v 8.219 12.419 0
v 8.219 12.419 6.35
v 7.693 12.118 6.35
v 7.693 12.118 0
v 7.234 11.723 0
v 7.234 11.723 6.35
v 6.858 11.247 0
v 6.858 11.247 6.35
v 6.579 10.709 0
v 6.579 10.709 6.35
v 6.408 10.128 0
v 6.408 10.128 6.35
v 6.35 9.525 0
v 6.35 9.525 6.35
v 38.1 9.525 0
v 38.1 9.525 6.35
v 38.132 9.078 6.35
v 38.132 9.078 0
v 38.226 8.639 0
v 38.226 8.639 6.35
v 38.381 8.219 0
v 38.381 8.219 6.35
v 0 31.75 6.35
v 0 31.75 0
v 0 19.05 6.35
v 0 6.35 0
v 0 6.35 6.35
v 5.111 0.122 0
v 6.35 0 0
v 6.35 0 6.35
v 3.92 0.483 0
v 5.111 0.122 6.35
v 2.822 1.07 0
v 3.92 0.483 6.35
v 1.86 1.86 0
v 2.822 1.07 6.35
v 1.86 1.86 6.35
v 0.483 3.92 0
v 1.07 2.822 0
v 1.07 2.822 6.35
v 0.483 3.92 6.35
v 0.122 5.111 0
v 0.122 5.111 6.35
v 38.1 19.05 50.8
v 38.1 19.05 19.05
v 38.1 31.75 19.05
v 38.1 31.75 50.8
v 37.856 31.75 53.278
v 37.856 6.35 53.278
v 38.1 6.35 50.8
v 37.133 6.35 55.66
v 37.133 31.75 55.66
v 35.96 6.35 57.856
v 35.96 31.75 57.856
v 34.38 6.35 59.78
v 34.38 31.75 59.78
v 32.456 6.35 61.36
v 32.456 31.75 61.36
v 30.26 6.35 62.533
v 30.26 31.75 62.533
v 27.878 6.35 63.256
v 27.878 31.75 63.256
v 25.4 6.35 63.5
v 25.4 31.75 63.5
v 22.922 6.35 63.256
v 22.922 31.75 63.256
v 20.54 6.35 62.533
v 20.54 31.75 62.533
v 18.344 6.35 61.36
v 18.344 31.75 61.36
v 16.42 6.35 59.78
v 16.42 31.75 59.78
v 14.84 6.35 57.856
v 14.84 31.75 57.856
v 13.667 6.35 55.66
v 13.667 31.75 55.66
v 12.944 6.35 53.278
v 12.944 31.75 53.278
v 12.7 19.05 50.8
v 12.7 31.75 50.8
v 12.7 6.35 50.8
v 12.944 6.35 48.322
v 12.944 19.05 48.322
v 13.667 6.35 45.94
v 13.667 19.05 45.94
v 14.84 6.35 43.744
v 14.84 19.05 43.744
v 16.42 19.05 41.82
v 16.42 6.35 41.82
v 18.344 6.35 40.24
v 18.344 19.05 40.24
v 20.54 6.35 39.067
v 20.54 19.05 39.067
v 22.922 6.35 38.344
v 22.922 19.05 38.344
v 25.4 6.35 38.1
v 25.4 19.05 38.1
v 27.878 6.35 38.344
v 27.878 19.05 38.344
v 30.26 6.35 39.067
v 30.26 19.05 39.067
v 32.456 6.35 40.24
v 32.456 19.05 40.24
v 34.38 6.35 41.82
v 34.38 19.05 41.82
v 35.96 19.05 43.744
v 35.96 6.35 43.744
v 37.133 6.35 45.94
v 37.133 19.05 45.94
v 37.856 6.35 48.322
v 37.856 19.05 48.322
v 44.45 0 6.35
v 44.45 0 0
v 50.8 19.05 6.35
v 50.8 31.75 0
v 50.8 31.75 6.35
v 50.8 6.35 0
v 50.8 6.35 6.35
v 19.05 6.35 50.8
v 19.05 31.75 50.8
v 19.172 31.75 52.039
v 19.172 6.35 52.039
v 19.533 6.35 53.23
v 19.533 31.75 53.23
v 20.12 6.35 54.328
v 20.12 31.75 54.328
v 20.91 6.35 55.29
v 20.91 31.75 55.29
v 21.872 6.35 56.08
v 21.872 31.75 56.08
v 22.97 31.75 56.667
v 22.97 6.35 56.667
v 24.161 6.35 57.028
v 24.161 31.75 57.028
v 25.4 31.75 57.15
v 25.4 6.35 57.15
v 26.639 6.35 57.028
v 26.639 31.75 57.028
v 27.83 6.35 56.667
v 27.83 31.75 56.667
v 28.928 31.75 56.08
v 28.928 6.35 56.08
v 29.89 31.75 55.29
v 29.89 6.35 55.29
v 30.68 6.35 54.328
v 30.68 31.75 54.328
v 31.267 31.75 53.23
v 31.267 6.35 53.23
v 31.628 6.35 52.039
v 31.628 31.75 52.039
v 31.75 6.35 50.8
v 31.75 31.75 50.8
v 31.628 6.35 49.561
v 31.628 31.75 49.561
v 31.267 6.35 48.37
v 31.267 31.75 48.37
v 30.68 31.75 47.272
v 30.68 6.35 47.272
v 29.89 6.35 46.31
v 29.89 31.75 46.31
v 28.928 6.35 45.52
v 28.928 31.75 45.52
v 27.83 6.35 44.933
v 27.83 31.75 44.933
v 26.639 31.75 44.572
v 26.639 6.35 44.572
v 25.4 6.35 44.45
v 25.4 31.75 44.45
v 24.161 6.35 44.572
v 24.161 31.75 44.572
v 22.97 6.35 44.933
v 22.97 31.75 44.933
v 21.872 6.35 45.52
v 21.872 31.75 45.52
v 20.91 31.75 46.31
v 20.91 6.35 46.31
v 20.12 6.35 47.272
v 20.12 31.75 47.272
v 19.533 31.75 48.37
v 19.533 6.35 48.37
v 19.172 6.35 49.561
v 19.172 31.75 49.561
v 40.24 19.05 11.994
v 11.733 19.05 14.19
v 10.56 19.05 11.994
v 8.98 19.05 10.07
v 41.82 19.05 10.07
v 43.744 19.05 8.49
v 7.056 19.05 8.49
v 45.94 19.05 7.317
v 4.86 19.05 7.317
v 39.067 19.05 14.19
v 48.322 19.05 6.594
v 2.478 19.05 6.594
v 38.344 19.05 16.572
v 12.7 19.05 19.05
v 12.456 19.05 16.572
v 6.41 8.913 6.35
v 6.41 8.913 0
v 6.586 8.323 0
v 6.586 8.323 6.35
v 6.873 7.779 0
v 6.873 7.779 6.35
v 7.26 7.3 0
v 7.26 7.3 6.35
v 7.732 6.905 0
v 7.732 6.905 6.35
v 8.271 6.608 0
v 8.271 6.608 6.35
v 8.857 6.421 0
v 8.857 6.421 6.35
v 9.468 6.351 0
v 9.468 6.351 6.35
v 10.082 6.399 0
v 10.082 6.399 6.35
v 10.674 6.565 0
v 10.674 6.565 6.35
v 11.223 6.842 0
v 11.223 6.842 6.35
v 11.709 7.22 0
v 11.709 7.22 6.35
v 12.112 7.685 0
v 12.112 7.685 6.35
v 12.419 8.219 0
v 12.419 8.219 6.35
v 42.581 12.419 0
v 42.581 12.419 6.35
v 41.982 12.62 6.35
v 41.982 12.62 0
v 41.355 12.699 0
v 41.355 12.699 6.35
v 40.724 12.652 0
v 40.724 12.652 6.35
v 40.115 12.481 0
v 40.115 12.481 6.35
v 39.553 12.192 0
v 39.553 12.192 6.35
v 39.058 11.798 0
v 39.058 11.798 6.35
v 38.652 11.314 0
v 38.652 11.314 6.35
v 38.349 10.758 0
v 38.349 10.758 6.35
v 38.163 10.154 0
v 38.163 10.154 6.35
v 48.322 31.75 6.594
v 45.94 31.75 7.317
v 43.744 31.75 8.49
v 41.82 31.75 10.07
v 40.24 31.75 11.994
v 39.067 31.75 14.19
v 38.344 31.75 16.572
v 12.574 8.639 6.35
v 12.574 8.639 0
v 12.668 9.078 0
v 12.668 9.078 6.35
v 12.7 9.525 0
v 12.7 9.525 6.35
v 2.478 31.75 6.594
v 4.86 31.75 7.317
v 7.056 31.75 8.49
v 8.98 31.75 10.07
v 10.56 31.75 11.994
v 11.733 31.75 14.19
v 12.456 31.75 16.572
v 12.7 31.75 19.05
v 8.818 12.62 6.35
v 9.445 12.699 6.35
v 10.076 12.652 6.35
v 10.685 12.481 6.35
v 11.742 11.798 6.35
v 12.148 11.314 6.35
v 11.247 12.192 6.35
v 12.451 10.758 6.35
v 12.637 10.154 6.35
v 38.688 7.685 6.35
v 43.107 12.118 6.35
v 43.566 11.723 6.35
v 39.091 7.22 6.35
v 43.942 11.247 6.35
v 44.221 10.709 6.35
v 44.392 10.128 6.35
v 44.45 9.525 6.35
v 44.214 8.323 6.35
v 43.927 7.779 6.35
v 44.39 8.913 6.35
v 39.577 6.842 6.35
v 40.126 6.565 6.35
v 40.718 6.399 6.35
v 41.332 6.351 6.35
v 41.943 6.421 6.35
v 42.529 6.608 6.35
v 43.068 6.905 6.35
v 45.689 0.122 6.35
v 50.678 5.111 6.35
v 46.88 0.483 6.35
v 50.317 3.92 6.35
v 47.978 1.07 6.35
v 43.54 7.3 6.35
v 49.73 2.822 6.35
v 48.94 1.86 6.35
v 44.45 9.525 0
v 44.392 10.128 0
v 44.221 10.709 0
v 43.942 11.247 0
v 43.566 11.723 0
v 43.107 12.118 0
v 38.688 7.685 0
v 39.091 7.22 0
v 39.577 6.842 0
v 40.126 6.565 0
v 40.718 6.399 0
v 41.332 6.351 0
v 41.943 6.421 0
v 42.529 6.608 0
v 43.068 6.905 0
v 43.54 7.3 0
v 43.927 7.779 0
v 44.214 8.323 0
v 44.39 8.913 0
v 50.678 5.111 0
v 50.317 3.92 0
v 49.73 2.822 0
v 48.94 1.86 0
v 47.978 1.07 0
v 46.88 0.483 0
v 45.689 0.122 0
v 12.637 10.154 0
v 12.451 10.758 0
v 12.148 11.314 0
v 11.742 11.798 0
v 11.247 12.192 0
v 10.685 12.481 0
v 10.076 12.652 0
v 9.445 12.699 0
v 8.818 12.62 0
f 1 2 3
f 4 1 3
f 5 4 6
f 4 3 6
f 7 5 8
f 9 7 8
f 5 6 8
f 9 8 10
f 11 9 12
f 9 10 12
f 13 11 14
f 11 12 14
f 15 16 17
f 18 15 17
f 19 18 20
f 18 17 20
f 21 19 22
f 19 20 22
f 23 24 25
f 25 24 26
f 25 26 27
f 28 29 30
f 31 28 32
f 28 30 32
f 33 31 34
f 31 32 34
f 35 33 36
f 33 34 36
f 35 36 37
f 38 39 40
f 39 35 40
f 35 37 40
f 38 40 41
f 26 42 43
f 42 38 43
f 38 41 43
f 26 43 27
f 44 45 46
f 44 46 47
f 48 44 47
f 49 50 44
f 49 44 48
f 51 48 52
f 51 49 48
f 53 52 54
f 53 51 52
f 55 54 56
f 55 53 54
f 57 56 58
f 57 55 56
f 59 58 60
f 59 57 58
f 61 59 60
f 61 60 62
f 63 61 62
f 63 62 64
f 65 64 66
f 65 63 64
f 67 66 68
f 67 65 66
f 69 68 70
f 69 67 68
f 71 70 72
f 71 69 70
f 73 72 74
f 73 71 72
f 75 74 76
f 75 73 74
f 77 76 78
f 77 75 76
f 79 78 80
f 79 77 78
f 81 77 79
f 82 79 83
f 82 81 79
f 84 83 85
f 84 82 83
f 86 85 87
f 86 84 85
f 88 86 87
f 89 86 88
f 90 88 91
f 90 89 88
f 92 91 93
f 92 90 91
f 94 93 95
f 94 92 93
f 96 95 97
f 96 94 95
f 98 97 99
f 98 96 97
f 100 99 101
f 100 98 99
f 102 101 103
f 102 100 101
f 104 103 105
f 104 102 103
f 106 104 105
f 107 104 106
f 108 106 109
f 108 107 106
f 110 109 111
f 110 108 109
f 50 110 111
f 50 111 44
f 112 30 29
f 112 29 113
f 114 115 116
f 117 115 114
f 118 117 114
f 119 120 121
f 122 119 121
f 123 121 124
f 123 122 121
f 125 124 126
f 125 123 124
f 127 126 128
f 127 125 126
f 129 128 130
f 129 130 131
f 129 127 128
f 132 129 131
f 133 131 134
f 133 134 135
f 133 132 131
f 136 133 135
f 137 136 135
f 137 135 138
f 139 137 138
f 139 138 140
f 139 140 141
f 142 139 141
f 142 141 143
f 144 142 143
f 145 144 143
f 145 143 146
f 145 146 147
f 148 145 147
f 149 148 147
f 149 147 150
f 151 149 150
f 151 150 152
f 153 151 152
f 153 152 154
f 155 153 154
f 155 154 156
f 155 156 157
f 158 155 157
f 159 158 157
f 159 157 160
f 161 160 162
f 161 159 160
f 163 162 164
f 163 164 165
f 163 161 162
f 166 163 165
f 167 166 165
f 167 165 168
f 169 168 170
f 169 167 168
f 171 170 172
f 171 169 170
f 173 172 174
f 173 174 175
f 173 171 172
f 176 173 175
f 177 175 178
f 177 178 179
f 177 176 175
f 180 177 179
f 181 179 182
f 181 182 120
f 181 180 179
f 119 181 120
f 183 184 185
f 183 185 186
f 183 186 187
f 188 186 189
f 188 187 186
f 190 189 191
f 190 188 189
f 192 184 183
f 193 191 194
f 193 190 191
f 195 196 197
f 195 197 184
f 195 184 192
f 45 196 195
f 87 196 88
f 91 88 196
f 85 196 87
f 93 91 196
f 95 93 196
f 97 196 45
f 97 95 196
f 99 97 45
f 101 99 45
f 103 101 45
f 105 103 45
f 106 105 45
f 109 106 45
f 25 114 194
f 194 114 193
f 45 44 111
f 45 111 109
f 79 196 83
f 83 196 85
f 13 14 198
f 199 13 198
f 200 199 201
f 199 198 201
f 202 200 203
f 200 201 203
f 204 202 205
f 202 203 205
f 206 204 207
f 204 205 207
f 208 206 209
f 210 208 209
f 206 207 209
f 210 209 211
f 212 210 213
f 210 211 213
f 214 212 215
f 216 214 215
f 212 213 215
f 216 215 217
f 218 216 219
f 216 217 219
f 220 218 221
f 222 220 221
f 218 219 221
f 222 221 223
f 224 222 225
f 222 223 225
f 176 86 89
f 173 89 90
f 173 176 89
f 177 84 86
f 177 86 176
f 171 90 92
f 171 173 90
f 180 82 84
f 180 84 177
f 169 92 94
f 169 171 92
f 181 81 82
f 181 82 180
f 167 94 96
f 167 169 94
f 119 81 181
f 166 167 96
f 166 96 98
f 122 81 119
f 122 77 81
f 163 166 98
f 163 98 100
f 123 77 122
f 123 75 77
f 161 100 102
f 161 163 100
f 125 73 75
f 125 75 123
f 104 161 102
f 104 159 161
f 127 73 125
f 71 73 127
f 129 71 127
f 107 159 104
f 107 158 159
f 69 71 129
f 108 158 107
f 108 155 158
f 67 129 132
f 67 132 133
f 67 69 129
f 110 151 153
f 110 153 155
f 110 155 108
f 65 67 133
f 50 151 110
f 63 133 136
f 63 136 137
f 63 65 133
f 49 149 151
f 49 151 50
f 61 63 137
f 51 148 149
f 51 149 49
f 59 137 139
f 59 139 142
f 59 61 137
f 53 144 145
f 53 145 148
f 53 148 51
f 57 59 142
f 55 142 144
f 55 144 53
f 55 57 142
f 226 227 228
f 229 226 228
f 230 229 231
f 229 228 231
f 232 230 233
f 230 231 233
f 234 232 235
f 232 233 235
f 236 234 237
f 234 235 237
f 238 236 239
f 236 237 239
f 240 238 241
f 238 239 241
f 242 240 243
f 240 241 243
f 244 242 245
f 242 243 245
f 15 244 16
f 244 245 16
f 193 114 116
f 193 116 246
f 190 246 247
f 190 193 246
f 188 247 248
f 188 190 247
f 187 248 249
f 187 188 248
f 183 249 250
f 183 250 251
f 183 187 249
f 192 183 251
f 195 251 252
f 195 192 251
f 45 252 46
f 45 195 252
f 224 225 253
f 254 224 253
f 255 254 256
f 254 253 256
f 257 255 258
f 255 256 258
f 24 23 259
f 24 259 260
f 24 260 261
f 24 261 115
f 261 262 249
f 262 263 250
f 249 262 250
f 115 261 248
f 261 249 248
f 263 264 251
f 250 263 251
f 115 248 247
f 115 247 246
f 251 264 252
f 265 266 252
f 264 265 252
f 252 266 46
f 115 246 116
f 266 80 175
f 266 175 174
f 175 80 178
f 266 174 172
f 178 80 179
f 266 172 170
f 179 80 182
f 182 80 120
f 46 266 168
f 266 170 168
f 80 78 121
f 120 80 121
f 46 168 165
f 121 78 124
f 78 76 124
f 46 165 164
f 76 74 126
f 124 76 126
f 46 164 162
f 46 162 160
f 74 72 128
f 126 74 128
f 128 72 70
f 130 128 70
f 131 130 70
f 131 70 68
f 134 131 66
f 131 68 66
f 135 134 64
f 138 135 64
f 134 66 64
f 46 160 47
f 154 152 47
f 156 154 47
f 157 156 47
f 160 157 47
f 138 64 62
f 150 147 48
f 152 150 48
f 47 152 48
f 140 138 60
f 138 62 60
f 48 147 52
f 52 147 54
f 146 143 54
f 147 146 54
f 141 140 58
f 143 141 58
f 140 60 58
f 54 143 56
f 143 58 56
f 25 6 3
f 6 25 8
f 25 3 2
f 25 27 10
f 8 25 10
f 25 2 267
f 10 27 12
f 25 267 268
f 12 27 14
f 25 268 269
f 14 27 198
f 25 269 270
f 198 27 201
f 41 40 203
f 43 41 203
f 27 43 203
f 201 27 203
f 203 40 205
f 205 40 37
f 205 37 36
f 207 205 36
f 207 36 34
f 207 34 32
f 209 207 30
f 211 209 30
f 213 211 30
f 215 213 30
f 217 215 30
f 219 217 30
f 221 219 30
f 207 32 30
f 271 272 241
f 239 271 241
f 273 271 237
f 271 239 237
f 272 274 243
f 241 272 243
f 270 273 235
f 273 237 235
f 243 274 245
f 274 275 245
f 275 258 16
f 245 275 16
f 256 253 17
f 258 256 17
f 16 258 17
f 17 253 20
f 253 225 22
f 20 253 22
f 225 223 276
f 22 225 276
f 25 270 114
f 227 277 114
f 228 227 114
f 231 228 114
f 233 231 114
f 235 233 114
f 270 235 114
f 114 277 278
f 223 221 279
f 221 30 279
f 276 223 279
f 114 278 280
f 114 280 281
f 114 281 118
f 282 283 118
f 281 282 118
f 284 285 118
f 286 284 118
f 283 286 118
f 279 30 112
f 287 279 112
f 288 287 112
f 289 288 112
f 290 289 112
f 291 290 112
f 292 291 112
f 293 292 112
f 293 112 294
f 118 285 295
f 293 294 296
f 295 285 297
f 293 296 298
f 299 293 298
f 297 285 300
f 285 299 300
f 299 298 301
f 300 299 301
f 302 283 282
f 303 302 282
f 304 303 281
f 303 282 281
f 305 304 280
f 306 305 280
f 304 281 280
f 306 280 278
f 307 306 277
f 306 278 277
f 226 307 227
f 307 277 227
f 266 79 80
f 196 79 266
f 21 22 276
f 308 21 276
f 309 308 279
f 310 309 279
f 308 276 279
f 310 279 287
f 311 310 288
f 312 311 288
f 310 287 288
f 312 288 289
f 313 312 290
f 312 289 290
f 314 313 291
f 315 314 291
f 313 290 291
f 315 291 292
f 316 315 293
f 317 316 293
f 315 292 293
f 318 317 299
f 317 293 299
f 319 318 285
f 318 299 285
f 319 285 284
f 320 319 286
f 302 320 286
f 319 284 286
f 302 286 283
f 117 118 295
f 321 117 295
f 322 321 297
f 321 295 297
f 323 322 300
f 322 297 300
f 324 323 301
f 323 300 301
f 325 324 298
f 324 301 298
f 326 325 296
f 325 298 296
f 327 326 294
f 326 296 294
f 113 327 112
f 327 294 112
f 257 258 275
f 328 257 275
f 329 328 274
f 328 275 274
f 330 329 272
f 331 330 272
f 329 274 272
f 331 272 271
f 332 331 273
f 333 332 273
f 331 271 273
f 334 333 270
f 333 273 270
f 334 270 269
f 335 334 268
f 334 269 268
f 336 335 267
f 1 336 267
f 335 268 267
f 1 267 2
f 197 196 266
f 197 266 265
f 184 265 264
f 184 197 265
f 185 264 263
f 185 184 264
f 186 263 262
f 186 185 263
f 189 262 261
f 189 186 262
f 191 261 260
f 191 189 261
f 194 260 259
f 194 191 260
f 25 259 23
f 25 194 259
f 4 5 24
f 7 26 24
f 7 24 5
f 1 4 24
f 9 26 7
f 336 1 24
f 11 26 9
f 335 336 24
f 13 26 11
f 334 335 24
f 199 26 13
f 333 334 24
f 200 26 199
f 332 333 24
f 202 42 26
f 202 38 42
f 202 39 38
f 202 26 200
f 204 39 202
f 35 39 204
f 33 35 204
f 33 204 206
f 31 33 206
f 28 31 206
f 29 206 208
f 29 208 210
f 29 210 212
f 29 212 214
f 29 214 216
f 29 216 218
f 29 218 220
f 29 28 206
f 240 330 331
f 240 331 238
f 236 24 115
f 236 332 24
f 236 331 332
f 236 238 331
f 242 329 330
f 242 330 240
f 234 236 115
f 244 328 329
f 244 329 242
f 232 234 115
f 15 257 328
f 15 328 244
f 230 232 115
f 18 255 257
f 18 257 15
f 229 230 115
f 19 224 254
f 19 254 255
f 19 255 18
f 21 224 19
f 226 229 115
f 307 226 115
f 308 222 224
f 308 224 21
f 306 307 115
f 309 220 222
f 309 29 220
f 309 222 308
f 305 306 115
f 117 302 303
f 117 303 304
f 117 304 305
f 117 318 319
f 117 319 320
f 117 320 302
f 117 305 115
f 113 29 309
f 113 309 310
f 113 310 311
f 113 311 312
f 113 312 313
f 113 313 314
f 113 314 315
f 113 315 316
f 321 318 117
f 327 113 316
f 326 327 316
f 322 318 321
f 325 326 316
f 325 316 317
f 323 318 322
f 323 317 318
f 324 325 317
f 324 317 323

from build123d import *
from build123d import SkipClean  # not in build123d's __all__

# Parameters (mm, degrees)
F0_W     = 50.8
F0_H     = 6.35
F1_DEPTH = 31.75
F3_DEPTH = 19.05
F4_DEPTH = 6.35
F6_DEPTH = 6.351


with BuildPart() as f1:
    # F0 (on Front) → F1 (new body)
    with BuildSketch(Plane.XZ):
        with Locations((25.4, 3.175)):
            Rectangle(F0_W, F0_H)
        with BuildLine():
            ThreePointArc((12.7, 19.05), (8.9802561211, 10.0697438789), (0, 6.35))
            Line((0, 6.35), (50.8, 6.35))
            ThreePointArc((50.8, 6.35), (41.8197438789, 10.0697438789), (38.1, 19.05))
            Line((38.1, 19.05), (38.1, 50.8))
            ThreePointArc((38.1, 50.8), (25.4, 38.1), (12.7, 50.8))
            Line((12.7, 50.8), (12.7, 19.05))
        make_face()
        with BuildLine():
            Line((19.05, 50.8), (12.7, 50.8))
            ThreePointArc((12.7, 50.8), (25.4, 38.1), (38.1, 50.8))
            Line((38.1, 50.8), (31.75, 50.8))
            ThreePointArc((31.75, 50.8), (25.4, 44.45), (19.05, 50.8))
        make_face()
        with BuildLine():
            ThreePointArc((38.1, 50.8), (25.4, 63.5), (12.7, 50.8))
            Line((12.7, 50.8), (19.05, 50.8))
            ThreePointArc((19.05, 50.8), (25.4, 57.15), (31.75, 50.8))
            Line((31.75, 50.8), (38.1, 50.8))
        make_face()
    extrude(amount=-F1_DEPTH)

    # F2 (on face) → F3 (cut)
    with BuildSketch(Plane.XZ):
        with BuildLine():
            ThreePointArc((12.7, 19.05), (8.9802561211, 10.0697438789), (0, 6.35))
            Line((0, 6.35), (50.8, 6.35))
            ThreePointArc((50.8, 6.35), (41.8197438789, 10.0697438789), (38.1, 19.05))
            Line((38.1, 19.05), (38.1, 50.8))
            ThreePointArc((38.1, 50.8), (25.4, 38.1), (12.7, 50.8))
            Line((12.7, 50.8), (12.7, 19.05))
        make_face()
    with SkipClean():  # cleaning this boolean's faces spoils the solid; the shape is the same uncleaned
        extrude(amount=-F3_DEPTH, mode=Mode.SUBTRACT)

    # F4 (cut): a face of the model
    f4_faces = [f1.faces().sort_by_distance(p)[0] for p in [
        (25.4, 0, 63.1407897552),
    ]]
    extrude(f4_faces, amount=-F4_DEPTH, mode=Mode.SUBTRACT)

    # F5 (on face) → F6 (cut, through all)
    with BuildSketch(Plane.XY.offset(6.35)):
        with BuildLine():
            ThreePointArc((12.7, 9.525), (11.2473638622, 12.1922247236), (8.2186848968, 12.4188151032))
            ThreePointArc((8.2186848968, 12.4188151032), (10.3079286634, 11.3156118148), (11.849261314, 9.525))
            Line((11.849261314, 9.525), (12.7, 9.525))
        make_face()
        with BuildLine():
            ThreePointArc((11.849261314, 9.525), (10.3079286634, 11.3156118148), (8.2186848968, 12.4188151032))
            ThreePointArc((8.2186848968, 12.4188151032), (6.8577752764, 11.2473638622), (6.35, 9.525))
            Line((6.35, 9.525), (11.849261314, 9.525))
        make_face()
        with BuildLine():
            ThreePointArc((6.35, 9.525), (8.8568824776, 6.4210921444), (12.4188151032, 8.2186848968))
            ThreePointArc((12.4188151032, 8.2186848968), (12.1708000125, 8.8878706063), (11.849261314, 9.525))
            Line((11.849261314, 9.525), (6.35, 9.525))
        make_face()
        with BuildLine():
            ThreePointArc((11.849261314, 9.525), (12.1708000125, 8.8878706063), (12.4188151032, 8.2186848968))
            ThreePointArc((12.4188151032, 8.2186848968), (12.6289078556, 8.8568824776), (12.7, 9.525))
            Line((12.7, 9.525), (11.849261314, 9.525))
        make_face()
        with BuildLine():
            ThreePointArc((38.950738686, 9.525), (40.4920713366, 11.3156118148), (42.5813151032, 12.4188151032))
            ThreePointArc((42.5813151032, 12.4188151032), (39.5526361378, 12.1922247236), (38.1, 9.525))
            Line((38.1, 9.525), (38.950738686, 9.525))
        make_face()
        with BuildLine():
            ThreePointArc((44.45, 9.525), (43.9422247236, 11.2473638622), (42.5813151032, 12.4188151032))
            ThreePointArc((42.5813151032, 12.4188151032), (40.4920713366, 11.3156118148), (38.950738686, 9.525))
            Line((38.950738686, 9.525), (44.45, 9.525))
        make_face()
        with BuildLine():
            ThreePointArc((38.950738686, 9.525), (38.6291999875, 8.8878706063), (38.3811848968, 8.2186848968))
            ThreePointArc((38.3811848968, 8.2186848968), (41.9431175224, 6.4210921444), (44.45, 9.525))
            Line((44.45, 9.525), (38.950738686, 9.525))
        make_face()
        with BuildLine():
            ThreePointArc((38.1, 9.525), (38.1710921444, 8.8568824776), (38.3811848968, 8.2186848968))
            ThreePointArc((38.3811848968, 8.2186848968), (38.6291999875, 8.8878706063), (38.950738686, 9.525))
            Line((38.950738686, 9.525), (38.1, 9.525))
        make_face()
        with BuildLine():
            Line((44.45, 0), (50.8, 0))
            Line((50.8, 0), (50.8, 6.35))
            ThreePointArc((50.8, 6.35), (48.9401280605, 1.8598719395), (44.45, 0))
        make_face()
        with BuildLine():
            Line((0, 0), (6.35, 0))
            ThreePointArc((6.35, 0), (1.8598719395, 1.8598719395), (0, 6.35))
            Line((0, 6.35), (0, 0))
        make_face()
    extrude(amount=-F6_DEPTH, mode=Mode.SUBTRACT)


solid = f1.part
